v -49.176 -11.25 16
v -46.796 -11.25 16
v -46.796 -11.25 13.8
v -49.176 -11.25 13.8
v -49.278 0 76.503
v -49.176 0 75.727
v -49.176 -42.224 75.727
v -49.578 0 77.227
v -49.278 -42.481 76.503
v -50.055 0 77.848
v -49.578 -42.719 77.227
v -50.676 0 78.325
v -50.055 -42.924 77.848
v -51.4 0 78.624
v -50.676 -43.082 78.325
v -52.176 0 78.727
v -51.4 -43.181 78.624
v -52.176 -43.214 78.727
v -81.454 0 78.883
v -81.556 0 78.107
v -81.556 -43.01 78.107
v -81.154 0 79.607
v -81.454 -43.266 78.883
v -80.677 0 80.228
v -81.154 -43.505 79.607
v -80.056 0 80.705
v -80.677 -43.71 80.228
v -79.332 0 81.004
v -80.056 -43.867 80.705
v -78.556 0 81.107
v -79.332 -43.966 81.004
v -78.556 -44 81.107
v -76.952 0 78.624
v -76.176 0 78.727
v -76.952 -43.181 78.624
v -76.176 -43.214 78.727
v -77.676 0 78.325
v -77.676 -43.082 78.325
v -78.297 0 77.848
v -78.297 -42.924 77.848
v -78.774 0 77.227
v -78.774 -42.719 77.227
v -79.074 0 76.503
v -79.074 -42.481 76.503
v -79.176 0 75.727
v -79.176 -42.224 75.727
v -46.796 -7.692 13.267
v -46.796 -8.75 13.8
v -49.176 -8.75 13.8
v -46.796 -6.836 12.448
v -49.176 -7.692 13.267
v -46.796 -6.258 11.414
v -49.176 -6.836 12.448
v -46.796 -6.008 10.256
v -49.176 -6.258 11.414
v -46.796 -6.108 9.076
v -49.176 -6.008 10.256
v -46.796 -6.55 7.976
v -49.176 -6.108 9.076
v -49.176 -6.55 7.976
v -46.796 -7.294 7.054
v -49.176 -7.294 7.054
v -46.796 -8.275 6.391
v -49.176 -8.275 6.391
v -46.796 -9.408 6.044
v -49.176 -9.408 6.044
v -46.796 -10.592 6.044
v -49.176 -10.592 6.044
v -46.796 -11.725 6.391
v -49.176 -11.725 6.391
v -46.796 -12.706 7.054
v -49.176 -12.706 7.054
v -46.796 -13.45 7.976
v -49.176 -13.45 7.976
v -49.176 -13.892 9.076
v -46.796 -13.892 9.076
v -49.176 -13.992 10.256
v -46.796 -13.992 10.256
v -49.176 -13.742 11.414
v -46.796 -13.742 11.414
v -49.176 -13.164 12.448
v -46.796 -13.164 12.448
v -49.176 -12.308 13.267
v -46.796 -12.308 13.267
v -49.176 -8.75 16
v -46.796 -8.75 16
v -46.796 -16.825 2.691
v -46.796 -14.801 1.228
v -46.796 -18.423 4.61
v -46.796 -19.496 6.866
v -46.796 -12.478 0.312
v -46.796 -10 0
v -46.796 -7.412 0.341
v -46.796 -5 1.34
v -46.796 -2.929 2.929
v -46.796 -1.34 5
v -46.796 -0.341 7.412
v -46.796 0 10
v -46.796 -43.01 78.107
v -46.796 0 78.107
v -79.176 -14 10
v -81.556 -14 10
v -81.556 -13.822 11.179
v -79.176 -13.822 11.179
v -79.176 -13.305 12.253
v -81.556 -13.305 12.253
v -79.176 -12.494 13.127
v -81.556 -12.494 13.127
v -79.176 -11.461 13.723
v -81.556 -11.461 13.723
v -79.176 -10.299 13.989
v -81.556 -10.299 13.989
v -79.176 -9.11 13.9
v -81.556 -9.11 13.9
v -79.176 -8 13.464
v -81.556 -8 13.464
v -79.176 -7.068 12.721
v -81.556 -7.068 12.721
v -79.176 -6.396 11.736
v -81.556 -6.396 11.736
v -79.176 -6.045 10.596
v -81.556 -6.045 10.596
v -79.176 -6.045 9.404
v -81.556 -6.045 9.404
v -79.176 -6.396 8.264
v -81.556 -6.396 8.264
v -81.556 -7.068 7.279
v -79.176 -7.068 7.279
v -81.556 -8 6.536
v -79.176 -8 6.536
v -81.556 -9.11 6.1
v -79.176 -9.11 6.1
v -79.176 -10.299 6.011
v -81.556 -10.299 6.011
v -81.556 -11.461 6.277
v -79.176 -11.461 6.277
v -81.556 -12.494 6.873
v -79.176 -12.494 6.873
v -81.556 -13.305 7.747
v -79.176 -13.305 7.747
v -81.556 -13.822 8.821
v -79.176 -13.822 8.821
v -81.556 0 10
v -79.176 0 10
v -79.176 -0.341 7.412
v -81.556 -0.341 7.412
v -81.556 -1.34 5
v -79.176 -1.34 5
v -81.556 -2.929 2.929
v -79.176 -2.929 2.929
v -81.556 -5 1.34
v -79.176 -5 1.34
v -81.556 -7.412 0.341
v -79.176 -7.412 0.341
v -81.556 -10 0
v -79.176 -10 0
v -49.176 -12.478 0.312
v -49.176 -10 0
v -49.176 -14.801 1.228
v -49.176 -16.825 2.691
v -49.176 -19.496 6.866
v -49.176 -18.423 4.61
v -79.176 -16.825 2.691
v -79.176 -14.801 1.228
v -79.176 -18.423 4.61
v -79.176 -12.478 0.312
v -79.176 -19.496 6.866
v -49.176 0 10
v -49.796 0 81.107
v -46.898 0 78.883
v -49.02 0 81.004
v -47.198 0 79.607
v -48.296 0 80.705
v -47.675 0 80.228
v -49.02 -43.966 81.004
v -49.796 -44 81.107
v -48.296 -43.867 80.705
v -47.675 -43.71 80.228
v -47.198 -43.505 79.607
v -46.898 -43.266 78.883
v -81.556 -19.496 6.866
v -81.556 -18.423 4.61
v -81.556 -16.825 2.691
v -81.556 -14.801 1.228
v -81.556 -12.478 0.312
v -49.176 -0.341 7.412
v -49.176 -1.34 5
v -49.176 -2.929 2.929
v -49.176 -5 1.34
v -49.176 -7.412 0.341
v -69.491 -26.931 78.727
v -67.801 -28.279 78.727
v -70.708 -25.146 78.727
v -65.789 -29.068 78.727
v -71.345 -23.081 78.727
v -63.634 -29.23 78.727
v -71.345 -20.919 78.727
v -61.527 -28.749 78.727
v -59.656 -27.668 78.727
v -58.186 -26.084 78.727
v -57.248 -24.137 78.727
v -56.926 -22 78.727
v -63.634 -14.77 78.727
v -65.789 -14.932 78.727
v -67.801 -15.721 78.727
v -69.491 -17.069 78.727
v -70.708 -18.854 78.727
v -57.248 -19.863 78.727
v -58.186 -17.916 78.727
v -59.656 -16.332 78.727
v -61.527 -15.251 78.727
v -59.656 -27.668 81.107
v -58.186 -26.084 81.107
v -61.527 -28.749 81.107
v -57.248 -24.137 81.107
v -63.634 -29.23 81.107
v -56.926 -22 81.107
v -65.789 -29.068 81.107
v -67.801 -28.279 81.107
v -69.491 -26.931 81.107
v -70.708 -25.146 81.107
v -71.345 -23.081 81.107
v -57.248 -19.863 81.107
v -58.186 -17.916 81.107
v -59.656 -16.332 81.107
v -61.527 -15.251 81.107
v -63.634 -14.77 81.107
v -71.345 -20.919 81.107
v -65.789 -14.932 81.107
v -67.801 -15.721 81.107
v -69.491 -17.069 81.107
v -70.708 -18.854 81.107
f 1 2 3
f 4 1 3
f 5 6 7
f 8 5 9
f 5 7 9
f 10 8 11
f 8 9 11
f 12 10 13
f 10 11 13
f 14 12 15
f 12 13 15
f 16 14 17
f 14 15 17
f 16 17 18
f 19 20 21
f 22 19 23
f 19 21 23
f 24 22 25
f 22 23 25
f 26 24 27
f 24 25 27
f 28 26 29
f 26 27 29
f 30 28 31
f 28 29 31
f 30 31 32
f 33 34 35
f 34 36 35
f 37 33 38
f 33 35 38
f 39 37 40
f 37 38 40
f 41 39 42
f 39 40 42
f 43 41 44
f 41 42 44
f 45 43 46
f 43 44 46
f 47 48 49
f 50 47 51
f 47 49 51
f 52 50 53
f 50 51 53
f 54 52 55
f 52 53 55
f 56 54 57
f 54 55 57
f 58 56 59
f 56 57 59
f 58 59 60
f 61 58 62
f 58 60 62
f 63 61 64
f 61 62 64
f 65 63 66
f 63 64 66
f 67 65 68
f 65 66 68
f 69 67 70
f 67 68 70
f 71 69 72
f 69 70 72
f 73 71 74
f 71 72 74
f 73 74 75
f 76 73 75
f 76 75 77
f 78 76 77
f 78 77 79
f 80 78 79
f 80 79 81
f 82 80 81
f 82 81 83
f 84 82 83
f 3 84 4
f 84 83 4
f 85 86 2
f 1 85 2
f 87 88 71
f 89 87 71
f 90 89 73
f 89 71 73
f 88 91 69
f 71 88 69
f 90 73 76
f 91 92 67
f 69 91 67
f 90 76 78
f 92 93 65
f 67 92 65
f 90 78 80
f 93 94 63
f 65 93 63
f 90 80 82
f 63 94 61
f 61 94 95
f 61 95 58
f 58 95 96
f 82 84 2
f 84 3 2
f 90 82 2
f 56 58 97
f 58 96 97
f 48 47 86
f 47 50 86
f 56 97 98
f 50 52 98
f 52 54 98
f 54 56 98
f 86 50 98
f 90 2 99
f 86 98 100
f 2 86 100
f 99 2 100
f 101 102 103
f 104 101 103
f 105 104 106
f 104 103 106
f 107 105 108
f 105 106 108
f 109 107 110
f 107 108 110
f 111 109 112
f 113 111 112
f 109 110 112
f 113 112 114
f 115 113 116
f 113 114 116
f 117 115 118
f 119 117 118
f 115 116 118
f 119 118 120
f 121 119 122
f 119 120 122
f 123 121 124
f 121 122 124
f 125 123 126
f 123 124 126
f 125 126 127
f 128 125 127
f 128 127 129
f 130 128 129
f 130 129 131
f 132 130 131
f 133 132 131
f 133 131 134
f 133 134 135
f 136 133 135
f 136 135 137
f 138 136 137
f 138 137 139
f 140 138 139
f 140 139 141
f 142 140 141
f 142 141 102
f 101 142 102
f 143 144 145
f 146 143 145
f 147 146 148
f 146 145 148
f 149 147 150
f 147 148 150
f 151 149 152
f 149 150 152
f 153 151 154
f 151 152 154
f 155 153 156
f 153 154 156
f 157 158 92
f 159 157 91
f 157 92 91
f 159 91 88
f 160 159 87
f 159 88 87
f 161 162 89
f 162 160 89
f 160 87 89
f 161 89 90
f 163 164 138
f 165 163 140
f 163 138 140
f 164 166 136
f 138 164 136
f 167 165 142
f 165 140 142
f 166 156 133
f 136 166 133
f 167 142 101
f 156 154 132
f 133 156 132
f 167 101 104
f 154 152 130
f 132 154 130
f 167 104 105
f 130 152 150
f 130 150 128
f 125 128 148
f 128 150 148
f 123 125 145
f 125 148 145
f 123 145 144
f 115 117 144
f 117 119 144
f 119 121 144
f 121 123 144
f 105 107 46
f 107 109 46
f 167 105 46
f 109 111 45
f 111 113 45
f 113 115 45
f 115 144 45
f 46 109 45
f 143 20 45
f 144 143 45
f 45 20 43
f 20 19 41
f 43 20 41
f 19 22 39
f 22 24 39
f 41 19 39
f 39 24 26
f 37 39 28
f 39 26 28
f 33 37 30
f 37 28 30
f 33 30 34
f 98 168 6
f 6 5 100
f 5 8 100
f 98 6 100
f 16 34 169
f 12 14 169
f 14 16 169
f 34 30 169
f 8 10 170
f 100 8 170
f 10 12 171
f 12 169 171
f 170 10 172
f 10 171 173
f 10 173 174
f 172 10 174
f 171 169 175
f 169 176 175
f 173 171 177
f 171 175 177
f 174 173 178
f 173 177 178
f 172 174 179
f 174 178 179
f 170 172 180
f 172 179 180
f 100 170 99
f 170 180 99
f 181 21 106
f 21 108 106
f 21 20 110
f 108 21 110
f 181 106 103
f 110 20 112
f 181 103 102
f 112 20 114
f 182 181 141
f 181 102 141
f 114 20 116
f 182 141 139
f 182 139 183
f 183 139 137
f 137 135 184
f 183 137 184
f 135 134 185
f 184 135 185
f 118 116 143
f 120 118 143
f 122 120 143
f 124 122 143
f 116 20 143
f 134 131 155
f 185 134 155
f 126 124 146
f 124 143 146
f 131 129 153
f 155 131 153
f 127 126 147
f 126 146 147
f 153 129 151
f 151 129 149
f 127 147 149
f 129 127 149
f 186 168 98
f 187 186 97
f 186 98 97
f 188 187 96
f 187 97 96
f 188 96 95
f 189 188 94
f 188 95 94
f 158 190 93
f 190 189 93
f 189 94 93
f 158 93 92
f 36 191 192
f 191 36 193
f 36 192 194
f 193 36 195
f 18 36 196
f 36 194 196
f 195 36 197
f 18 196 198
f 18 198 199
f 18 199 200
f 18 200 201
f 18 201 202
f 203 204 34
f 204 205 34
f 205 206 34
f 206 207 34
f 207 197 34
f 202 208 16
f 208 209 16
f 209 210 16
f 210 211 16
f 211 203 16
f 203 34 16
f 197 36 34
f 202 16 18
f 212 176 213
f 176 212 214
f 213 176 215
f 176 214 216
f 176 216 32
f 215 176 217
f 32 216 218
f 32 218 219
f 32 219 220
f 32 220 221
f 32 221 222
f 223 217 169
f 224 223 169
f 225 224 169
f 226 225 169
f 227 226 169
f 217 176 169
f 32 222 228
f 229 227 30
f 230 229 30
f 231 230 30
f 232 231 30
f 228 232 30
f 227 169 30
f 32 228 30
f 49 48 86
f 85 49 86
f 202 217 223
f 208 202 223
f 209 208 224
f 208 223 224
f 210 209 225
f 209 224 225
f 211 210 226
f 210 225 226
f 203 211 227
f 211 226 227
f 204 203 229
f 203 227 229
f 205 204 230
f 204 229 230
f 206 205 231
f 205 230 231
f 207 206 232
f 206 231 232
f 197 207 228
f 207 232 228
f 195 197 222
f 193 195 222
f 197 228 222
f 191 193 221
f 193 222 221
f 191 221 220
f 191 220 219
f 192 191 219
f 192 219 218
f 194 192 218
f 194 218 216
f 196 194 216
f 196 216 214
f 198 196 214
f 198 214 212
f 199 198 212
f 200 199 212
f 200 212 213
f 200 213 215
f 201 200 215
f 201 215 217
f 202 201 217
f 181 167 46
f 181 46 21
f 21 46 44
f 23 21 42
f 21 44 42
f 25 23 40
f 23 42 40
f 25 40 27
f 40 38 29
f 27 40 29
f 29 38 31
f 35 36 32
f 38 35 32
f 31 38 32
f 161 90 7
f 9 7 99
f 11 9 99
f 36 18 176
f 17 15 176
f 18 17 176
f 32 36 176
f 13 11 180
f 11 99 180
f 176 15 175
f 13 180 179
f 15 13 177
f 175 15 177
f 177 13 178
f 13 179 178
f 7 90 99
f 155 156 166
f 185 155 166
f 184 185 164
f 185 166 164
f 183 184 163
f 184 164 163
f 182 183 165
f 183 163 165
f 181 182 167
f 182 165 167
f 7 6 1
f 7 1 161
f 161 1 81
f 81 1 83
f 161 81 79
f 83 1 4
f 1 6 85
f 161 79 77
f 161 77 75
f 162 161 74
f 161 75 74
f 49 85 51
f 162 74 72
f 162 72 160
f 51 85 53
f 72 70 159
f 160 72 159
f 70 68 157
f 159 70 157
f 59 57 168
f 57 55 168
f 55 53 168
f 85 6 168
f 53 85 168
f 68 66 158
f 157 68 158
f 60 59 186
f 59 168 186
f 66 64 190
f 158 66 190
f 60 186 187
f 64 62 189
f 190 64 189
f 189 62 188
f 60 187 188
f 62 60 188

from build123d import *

# Parameters (mm, degrees)
F1_DEPTH  = 44
F3_DEPTH  = 45.2
F4_DEPTH  = 52
F5_R      = 4
F6_DEPTH  = 57.3
F7_R      = 7.25
F8_DEPTH  = 25
F9_R      = 3
F10_R     = 3
F11_R     = 3
F12_R     = 3
F14_DEPTH = 25
F15_DEPTH = 25
F17_DEPTH = 25
F18_DEPTH = 25
F19_DEPTH = 25
F21_DEPTH = 25


with BuildPart() as f1:
    # F0 (on Front) → F1 (new body)
    with BuildSketch(Plane.XZ):
        Polygon((-81.5560135724, 81.1066666667), (-81.5560135724, 0), (-79.1760135724, 0), (-79.1760135724, 78.7266666667), (-49.1760135724, 78.7266666667), (-49.1760135724, 0), (-46.7960135724, 0), (-46.7960135724, 81.1066666667), align=None)
    extrude(amount=F1_DEPTH)

    # F2 (on face) → F3 (cut)
    with BuildSketch(Plane.YZ.offset(-46.7960135724)):
        with BuildLine():
            ThreePointArc((-10.0000000069, 0), (-15.8590620568, 1.8962112679), (-19.4961202132, 6.8657216307))
            Line((-19.4961202132, 6.8657216307), (-44, 81.1066666667))
            Line((-44, 81.1066666667), (-44, 0))
            Line((-44, 0), (-10.0000000069, 0))
        make_face()
    extrude(amount=-F3_DEPTH, mode=Mode.SUBTRACT)

    # F2 (on face) → F4 (cut)
    with BuildSketch(Plane.YZ.offset(-46.7960135724)):
        with BuildLine():
            ThreePointArc((0, 10.0000000432), (-2.9289321753, 2.928932201), (-10.0000000069, 0))
            Line((-10.0000000069, 0), (0, 0))
            Line((0, 0), (0, 10.0000000432))
        make_face()
    extrude(amount=-F4_DEPTH, mode=Mode.SUBTRACT)

    # F5 (on face) → F6 (cut)
    with BuildSketch(Plane(origin=(-81.5560135724, 0, 0), x_dir=(0, -1, 0), z_dir=(-1, 0, 0))):
        with Locations((10, 10)):
            Circle(F5_R)
    extrude(amount=-F6_DEPTH, mode=Mode.SUBTRACT)

    # F7 (on face) → F8 (cut)
    with BuildSketch(Plane.XY.offset(81.1066666667)):
        with Locations((-64.1760135724, -22)):
            Circle(F7_R)
    extrude(amount=-F8_DEPTH, mode=Mode.SUBTRACT)

    # F9
    f9_edges = [f1.edges().sort_by_distance(p)[0] for p in [
        (-81.556014, -22, 81.106667),
    ]]
    fillet(f9_edges, radius=F9_R)

    # F10
    f10_edges = [f1.edges().sort_by_distance(p)[0] for p in [
        (-46.796014, -22, 81.106667),
    ]]
    fillet(f10_edges, radius=F10_R)

    # F11
    f11_edges = [f1.edges().sort_by_distance(p)[0] for p in [
        (-49.176014, -21.60723, 78.726667),
    ]]
    fillet(f11_edges, radius=F11_R)

    # F12
    f12_edges = [f1.edges().sort_by_distance(p)[0] for p in [
        (-79.176014, -21.60723, 78.726667),
    ]]
    fillet(f12_edges, radius=F12_R)

    # F13 (on face) → F14 (cut)
    with BuildSketch(Plane.YZ.offset(-46.7960135724)):
        Polygon((-11.25, 16), (-11.25, 14), (-11.25, 13.495109044), (-10, 13.5341417044), (-8.75, 13.5731743649), (-8.75, 14), (-8.75, 16), align=None)
    extrude(amount=-F14_DEPTH, mode=Mode.SUBTRACT)

    # F13 (on face) → F15 (cut)
    with BuildSketch(Plane.YZ.offset(-46.7960135724)):
        Polygon((-11.25, 16), (-11.25, 14), (-11.25, 13.495109044), (-10, 13.5341417044), (-8.75, 13.5731743649), (-8.75, 14), (-8.75, 16), align=None)
    extrude(amount=-F15_DEPTH, mode=Mode.SUBTRACT)

    # F13 (on face) → F18 (cut)
    with BuildSketch(Plane.YZ.offset(-46.7960135724)):
        Polygon((-11.25, 16), (-11.25, 14), (-11.25, 13.495109044), (-10, 13.5341417044), (-8.75, 13.5731743649), (-8.75, 14), (-8.75, 16), align=None)
    extrude(amount=-F18_DEPTH, mode=Mode.SUBTRACT)

    # F13 (on face) → F21 (cut)
    with BuildSketch(Plane.YZ.offset(-46.7960135724)):
        Polygon((-11.25, 16), (-11.25, 14), (-11.25, 13.495109044), (-10, 13.5341417044), (-8.75, 13.5731743649), (-8.75, 14), (-8.75, 16), align=None)
    extrude(amount=-F21_DEPTH, mode=Mode.SUBTRACT)


with BuildPart() as f17:
    # F5 (on face) → F17 (new body)
    with BuildSketch(Plane(origin=(-81.5560135724, 0, 0), x_dir=(0, -1, 0), z_dir=(-1, 0, 0))):
        with Locations((10, 10)):
            Circle(F5_R)
    extrude(amount=F17_DEPTH)

    # F19 (cut): a face of the model
    f19_faces = [f17.faces().sort_by_distance(p)[0] for p in [
        (-106.5560135724, -10, 10),
    ]]
    extrude(f19_faces, amount=-F19_DEPTH, mode=Mode.SUBTRACT)


solid = f1.part
